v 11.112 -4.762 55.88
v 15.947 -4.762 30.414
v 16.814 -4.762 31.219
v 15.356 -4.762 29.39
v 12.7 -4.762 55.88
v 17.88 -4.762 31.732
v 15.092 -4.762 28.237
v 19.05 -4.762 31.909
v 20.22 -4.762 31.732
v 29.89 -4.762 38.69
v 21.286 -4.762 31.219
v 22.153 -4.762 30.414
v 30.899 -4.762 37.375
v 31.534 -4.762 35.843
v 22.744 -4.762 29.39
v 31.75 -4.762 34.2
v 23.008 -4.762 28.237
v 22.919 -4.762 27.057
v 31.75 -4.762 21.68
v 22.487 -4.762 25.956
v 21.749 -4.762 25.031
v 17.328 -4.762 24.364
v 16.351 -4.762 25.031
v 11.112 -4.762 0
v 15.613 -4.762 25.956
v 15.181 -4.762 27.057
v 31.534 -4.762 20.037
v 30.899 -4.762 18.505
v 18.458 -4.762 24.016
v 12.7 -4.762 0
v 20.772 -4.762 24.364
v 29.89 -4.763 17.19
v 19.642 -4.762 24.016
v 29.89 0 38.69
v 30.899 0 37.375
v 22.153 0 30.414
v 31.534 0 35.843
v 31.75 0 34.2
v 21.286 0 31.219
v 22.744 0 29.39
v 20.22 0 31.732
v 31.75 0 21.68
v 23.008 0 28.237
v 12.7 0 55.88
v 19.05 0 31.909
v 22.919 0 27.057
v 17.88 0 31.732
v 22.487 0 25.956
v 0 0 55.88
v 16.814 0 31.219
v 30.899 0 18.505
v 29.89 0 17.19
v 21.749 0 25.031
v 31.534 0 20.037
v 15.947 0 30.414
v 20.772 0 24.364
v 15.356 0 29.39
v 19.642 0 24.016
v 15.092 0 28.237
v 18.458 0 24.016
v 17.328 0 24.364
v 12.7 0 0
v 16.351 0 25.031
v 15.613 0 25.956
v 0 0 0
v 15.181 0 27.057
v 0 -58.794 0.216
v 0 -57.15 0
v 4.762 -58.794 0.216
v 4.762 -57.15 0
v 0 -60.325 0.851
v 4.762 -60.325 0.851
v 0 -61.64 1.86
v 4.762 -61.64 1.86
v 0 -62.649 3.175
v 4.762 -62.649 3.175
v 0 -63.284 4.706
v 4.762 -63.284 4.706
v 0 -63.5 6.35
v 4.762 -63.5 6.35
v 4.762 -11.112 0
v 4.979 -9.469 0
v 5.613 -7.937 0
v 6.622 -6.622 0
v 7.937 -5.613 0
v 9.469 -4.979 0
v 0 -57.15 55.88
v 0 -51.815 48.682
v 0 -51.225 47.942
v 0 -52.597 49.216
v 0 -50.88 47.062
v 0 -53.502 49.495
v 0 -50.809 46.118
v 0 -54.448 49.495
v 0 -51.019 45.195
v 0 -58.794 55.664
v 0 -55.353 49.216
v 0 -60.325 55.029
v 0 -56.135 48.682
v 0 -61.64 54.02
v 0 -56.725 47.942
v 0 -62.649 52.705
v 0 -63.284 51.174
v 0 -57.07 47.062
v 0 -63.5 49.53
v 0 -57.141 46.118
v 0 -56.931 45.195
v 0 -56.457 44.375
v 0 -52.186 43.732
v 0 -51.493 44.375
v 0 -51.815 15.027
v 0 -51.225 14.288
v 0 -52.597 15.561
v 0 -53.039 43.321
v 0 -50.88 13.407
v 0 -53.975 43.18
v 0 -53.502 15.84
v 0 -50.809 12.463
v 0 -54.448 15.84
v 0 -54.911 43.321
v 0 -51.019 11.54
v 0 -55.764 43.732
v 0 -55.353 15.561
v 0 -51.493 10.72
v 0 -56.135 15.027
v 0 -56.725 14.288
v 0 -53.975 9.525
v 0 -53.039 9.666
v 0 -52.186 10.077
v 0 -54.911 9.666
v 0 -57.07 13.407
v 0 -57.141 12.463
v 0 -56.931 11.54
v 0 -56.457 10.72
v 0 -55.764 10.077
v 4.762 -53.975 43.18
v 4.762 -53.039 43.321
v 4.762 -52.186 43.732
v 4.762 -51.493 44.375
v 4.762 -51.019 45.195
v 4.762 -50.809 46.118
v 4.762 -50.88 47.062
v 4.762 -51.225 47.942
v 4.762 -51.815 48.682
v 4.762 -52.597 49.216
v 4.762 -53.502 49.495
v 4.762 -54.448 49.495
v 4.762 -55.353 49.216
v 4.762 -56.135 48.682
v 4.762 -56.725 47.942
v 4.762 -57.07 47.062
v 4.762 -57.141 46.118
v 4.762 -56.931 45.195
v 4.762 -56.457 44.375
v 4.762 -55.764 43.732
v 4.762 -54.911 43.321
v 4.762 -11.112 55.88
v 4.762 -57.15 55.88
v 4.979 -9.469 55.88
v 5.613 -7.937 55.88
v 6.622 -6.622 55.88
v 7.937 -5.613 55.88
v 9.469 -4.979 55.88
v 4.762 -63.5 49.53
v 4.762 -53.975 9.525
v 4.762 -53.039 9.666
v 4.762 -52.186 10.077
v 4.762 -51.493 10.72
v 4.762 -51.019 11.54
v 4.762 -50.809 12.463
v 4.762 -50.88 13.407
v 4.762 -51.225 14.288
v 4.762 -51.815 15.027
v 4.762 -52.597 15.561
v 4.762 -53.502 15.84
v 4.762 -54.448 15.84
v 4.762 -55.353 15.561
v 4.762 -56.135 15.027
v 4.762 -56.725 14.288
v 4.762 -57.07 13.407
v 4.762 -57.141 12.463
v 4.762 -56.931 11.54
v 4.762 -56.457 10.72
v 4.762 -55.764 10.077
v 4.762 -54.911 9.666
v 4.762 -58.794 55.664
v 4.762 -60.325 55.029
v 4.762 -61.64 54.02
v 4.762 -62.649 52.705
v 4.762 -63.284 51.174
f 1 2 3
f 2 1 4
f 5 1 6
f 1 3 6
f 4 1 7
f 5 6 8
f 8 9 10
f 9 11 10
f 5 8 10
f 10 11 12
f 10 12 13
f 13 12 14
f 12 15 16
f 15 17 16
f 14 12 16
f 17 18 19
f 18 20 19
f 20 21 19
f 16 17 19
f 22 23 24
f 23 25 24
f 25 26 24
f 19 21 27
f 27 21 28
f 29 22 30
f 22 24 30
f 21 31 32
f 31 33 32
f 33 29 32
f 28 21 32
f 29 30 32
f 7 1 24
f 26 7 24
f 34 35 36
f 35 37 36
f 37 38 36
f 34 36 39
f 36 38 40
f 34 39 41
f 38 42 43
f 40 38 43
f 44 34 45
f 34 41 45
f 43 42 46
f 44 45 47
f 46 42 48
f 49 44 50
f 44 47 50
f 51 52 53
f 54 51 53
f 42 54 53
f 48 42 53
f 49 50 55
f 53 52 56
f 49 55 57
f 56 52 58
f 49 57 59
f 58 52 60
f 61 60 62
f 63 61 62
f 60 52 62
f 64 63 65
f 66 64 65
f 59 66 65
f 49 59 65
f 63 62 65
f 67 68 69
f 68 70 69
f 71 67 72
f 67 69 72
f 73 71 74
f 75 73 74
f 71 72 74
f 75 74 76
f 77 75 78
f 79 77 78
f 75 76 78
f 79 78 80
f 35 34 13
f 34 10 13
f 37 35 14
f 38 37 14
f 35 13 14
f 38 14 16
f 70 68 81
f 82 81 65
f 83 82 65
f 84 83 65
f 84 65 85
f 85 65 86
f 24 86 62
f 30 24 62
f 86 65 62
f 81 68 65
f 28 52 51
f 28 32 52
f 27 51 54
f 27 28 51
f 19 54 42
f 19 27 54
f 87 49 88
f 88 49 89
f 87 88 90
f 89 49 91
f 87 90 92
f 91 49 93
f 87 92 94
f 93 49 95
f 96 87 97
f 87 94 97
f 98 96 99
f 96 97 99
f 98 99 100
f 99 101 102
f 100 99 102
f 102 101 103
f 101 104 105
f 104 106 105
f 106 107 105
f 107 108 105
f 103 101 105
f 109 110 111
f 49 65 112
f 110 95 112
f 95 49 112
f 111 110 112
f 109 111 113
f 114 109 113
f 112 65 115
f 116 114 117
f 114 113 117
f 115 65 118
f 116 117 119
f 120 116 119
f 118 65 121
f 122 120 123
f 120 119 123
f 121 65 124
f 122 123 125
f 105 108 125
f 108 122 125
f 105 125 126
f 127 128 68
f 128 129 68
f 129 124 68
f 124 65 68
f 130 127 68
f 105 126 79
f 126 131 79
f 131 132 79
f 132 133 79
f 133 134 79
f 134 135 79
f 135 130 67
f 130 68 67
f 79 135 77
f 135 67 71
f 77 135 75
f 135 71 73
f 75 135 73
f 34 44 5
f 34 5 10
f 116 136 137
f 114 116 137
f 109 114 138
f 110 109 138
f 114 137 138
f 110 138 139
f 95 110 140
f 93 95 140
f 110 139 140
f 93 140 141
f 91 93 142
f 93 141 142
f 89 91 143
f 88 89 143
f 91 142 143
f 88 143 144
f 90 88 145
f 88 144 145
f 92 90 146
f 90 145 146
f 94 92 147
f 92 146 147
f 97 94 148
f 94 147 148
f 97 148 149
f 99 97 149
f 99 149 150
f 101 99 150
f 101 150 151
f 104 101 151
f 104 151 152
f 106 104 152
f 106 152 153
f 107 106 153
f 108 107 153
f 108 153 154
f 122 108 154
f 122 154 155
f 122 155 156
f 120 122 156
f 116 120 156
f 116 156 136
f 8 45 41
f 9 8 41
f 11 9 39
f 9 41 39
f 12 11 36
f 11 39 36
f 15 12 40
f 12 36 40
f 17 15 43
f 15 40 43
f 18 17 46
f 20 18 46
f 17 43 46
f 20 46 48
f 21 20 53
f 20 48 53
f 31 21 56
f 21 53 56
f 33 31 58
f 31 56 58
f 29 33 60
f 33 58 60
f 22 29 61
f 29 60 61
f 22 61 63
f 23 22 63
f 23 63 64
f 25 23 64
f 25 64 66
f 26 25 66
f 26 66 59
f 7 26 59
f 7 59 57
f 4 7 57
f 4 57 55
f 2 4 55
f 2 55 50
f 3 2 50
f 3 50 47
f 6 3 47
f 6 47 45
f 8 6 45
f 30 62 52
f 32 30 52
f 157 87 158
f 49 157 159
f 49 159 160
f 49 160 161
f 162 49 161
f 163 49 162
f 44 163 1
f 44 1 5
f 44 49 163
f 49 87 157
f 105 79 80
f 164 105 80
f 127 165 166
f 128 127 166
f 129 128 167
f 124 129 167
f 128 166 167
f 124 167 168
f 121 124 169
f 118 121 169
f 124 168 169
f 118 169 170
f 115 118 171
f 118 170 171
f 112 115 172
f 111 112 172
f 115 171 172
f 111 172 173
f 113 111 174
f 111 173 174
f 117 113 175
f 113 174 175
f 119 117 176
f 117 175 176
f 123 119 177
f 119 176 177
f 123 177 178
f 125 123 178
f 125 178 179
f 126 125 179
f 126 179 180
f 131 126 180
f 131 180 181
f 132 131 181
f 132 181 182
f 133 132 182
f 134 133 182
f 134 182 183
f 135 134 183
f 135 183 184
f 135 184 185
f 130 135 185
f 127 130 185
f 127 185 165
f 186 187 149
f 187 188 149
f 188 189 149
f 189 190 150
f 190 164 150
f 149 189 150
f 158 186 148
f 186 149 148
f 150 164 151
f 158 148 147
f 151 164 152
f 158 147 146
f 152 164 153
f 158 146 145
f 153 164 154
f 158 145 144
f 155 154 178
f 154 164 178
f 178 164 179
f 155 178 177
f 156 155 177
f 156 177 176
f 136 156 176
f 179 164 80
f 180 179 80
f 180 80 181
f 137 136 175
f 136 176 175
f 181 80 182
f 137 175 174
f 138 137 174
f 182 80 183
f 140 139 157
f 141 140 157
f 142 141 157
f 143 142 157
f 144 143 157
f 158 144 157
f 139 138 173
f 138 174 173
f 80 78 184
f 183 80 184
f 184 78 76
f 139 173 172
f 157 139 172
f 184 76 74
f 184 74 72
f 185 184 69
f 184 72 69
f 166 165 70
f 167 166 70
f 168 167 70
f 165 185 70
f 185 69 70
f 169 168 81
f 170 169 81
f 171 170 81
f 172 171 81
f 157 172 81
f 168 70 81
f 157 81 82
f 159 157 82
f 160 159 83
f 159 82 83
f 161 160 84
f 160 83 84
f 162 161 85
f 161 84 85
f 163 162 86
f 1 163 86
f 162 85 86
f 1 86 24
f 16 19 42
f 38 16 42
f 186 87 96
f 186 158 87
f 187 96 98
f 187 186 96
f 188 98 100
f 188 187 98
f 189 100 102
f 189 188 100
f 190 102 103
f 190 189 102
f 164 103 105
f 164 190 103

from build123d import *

# Parameters (mm, degrees)
BOSS_EXTRUDE1_DEPTH = 55.88
SKETCH2_R           = 3.96875
CUT_EXTRUDE1_DEPTH  = 31.75
SKETCH3_R           = 3.175
CUT_EXTRUDE2_DEPTH  = 31.75
CUT_EXTRUDE3_DEPTH  = 91.348696172
FILLET2_R           = 6.35


with BuildPart() as part:
    # Sketch1 → Boss-Extrude1 (new body)
    with BuildSketch(Plane.XY):
        with BuildLine():
            Line((0, 0), (0, -63.5))
            Line((0, -63.5), (4.7625, -63.5))
            Line((4.7625, -63.5), (4.7625, -11.1125))
            ThreePointArc((4.7625, -11.1125), (6.622371939, -6.622371939), (11.1125, -4.7625))
            Line((11.1125, -4.7625), (31.75, -4.7625))
            Line((31.75, -4.7625), (31.75, 0))
            Line((31.75, 0), (0, 0))
        make_face()
    extrude(amount=BOSS_EXTRUDE1_DEPTH)

    # Sketch2 → Cut-Extrude1 (cut)
    with BuildSketch(Plane(origin=(0, 0, 0), x_dir=(1, 0, 0), z_dir=(0, 1, 0))):
        with Locations(Location((19.05, -27.94, 0), (0, 0, 270))):
            Circle(SKETCH2_R)
    extrude(amount=-CUT_EXTRUDE1_DEPTH, mode=Mode.SUBTRACT)

    # Sketch3 → Cut-Extrude2 (cut)
    with BuildSketch(Plane(origin=(4.7625, 0, 0), x_dir=(0, 0, -1), z_dir=(1, 0, 0))):
        with Locations((-46.355, -53.975)):
            Circle(SKETCH3_R)
        with Locations((-12.7, -53.975)):
            Circle(SKETCH3_R)
    extrude(amount=-CUT_EXTRUDE2_DEPTH, mode=Mode.SUBTRACT)

    # Sketch4 → Cut-Extrude3 (cut, through all)
    with BuildSketch(Plane(origin=(0, 0, 0), x_dir=(1, 0, 0), z_dir=(0, 1, 0))):
        Polygon((12.7, -55.88), (31.75, -36.83), (31.75, -55.88), align=None)
        Polygon((12.7, 0), (31.75, -19.05), (31.75, 0), align=None)
    extrude(amount=-CUT_EXTRUDE3_DEPTH, mode=Mode.SUBTRACT)

    # Fillet2
    fillet2_edges = [part.edges().sort_by_distance(p)[0] for p in [
        (2.38125, -63.5, 55.88),
        (31.75, -2.38125, 36.83),
        (31.75, -2.38125, 19.05),
        (2.38125, -63.5, 0),
    ]]
    fillet(fillet2_edges, radius=FILLET2_R)


solid = part.part
